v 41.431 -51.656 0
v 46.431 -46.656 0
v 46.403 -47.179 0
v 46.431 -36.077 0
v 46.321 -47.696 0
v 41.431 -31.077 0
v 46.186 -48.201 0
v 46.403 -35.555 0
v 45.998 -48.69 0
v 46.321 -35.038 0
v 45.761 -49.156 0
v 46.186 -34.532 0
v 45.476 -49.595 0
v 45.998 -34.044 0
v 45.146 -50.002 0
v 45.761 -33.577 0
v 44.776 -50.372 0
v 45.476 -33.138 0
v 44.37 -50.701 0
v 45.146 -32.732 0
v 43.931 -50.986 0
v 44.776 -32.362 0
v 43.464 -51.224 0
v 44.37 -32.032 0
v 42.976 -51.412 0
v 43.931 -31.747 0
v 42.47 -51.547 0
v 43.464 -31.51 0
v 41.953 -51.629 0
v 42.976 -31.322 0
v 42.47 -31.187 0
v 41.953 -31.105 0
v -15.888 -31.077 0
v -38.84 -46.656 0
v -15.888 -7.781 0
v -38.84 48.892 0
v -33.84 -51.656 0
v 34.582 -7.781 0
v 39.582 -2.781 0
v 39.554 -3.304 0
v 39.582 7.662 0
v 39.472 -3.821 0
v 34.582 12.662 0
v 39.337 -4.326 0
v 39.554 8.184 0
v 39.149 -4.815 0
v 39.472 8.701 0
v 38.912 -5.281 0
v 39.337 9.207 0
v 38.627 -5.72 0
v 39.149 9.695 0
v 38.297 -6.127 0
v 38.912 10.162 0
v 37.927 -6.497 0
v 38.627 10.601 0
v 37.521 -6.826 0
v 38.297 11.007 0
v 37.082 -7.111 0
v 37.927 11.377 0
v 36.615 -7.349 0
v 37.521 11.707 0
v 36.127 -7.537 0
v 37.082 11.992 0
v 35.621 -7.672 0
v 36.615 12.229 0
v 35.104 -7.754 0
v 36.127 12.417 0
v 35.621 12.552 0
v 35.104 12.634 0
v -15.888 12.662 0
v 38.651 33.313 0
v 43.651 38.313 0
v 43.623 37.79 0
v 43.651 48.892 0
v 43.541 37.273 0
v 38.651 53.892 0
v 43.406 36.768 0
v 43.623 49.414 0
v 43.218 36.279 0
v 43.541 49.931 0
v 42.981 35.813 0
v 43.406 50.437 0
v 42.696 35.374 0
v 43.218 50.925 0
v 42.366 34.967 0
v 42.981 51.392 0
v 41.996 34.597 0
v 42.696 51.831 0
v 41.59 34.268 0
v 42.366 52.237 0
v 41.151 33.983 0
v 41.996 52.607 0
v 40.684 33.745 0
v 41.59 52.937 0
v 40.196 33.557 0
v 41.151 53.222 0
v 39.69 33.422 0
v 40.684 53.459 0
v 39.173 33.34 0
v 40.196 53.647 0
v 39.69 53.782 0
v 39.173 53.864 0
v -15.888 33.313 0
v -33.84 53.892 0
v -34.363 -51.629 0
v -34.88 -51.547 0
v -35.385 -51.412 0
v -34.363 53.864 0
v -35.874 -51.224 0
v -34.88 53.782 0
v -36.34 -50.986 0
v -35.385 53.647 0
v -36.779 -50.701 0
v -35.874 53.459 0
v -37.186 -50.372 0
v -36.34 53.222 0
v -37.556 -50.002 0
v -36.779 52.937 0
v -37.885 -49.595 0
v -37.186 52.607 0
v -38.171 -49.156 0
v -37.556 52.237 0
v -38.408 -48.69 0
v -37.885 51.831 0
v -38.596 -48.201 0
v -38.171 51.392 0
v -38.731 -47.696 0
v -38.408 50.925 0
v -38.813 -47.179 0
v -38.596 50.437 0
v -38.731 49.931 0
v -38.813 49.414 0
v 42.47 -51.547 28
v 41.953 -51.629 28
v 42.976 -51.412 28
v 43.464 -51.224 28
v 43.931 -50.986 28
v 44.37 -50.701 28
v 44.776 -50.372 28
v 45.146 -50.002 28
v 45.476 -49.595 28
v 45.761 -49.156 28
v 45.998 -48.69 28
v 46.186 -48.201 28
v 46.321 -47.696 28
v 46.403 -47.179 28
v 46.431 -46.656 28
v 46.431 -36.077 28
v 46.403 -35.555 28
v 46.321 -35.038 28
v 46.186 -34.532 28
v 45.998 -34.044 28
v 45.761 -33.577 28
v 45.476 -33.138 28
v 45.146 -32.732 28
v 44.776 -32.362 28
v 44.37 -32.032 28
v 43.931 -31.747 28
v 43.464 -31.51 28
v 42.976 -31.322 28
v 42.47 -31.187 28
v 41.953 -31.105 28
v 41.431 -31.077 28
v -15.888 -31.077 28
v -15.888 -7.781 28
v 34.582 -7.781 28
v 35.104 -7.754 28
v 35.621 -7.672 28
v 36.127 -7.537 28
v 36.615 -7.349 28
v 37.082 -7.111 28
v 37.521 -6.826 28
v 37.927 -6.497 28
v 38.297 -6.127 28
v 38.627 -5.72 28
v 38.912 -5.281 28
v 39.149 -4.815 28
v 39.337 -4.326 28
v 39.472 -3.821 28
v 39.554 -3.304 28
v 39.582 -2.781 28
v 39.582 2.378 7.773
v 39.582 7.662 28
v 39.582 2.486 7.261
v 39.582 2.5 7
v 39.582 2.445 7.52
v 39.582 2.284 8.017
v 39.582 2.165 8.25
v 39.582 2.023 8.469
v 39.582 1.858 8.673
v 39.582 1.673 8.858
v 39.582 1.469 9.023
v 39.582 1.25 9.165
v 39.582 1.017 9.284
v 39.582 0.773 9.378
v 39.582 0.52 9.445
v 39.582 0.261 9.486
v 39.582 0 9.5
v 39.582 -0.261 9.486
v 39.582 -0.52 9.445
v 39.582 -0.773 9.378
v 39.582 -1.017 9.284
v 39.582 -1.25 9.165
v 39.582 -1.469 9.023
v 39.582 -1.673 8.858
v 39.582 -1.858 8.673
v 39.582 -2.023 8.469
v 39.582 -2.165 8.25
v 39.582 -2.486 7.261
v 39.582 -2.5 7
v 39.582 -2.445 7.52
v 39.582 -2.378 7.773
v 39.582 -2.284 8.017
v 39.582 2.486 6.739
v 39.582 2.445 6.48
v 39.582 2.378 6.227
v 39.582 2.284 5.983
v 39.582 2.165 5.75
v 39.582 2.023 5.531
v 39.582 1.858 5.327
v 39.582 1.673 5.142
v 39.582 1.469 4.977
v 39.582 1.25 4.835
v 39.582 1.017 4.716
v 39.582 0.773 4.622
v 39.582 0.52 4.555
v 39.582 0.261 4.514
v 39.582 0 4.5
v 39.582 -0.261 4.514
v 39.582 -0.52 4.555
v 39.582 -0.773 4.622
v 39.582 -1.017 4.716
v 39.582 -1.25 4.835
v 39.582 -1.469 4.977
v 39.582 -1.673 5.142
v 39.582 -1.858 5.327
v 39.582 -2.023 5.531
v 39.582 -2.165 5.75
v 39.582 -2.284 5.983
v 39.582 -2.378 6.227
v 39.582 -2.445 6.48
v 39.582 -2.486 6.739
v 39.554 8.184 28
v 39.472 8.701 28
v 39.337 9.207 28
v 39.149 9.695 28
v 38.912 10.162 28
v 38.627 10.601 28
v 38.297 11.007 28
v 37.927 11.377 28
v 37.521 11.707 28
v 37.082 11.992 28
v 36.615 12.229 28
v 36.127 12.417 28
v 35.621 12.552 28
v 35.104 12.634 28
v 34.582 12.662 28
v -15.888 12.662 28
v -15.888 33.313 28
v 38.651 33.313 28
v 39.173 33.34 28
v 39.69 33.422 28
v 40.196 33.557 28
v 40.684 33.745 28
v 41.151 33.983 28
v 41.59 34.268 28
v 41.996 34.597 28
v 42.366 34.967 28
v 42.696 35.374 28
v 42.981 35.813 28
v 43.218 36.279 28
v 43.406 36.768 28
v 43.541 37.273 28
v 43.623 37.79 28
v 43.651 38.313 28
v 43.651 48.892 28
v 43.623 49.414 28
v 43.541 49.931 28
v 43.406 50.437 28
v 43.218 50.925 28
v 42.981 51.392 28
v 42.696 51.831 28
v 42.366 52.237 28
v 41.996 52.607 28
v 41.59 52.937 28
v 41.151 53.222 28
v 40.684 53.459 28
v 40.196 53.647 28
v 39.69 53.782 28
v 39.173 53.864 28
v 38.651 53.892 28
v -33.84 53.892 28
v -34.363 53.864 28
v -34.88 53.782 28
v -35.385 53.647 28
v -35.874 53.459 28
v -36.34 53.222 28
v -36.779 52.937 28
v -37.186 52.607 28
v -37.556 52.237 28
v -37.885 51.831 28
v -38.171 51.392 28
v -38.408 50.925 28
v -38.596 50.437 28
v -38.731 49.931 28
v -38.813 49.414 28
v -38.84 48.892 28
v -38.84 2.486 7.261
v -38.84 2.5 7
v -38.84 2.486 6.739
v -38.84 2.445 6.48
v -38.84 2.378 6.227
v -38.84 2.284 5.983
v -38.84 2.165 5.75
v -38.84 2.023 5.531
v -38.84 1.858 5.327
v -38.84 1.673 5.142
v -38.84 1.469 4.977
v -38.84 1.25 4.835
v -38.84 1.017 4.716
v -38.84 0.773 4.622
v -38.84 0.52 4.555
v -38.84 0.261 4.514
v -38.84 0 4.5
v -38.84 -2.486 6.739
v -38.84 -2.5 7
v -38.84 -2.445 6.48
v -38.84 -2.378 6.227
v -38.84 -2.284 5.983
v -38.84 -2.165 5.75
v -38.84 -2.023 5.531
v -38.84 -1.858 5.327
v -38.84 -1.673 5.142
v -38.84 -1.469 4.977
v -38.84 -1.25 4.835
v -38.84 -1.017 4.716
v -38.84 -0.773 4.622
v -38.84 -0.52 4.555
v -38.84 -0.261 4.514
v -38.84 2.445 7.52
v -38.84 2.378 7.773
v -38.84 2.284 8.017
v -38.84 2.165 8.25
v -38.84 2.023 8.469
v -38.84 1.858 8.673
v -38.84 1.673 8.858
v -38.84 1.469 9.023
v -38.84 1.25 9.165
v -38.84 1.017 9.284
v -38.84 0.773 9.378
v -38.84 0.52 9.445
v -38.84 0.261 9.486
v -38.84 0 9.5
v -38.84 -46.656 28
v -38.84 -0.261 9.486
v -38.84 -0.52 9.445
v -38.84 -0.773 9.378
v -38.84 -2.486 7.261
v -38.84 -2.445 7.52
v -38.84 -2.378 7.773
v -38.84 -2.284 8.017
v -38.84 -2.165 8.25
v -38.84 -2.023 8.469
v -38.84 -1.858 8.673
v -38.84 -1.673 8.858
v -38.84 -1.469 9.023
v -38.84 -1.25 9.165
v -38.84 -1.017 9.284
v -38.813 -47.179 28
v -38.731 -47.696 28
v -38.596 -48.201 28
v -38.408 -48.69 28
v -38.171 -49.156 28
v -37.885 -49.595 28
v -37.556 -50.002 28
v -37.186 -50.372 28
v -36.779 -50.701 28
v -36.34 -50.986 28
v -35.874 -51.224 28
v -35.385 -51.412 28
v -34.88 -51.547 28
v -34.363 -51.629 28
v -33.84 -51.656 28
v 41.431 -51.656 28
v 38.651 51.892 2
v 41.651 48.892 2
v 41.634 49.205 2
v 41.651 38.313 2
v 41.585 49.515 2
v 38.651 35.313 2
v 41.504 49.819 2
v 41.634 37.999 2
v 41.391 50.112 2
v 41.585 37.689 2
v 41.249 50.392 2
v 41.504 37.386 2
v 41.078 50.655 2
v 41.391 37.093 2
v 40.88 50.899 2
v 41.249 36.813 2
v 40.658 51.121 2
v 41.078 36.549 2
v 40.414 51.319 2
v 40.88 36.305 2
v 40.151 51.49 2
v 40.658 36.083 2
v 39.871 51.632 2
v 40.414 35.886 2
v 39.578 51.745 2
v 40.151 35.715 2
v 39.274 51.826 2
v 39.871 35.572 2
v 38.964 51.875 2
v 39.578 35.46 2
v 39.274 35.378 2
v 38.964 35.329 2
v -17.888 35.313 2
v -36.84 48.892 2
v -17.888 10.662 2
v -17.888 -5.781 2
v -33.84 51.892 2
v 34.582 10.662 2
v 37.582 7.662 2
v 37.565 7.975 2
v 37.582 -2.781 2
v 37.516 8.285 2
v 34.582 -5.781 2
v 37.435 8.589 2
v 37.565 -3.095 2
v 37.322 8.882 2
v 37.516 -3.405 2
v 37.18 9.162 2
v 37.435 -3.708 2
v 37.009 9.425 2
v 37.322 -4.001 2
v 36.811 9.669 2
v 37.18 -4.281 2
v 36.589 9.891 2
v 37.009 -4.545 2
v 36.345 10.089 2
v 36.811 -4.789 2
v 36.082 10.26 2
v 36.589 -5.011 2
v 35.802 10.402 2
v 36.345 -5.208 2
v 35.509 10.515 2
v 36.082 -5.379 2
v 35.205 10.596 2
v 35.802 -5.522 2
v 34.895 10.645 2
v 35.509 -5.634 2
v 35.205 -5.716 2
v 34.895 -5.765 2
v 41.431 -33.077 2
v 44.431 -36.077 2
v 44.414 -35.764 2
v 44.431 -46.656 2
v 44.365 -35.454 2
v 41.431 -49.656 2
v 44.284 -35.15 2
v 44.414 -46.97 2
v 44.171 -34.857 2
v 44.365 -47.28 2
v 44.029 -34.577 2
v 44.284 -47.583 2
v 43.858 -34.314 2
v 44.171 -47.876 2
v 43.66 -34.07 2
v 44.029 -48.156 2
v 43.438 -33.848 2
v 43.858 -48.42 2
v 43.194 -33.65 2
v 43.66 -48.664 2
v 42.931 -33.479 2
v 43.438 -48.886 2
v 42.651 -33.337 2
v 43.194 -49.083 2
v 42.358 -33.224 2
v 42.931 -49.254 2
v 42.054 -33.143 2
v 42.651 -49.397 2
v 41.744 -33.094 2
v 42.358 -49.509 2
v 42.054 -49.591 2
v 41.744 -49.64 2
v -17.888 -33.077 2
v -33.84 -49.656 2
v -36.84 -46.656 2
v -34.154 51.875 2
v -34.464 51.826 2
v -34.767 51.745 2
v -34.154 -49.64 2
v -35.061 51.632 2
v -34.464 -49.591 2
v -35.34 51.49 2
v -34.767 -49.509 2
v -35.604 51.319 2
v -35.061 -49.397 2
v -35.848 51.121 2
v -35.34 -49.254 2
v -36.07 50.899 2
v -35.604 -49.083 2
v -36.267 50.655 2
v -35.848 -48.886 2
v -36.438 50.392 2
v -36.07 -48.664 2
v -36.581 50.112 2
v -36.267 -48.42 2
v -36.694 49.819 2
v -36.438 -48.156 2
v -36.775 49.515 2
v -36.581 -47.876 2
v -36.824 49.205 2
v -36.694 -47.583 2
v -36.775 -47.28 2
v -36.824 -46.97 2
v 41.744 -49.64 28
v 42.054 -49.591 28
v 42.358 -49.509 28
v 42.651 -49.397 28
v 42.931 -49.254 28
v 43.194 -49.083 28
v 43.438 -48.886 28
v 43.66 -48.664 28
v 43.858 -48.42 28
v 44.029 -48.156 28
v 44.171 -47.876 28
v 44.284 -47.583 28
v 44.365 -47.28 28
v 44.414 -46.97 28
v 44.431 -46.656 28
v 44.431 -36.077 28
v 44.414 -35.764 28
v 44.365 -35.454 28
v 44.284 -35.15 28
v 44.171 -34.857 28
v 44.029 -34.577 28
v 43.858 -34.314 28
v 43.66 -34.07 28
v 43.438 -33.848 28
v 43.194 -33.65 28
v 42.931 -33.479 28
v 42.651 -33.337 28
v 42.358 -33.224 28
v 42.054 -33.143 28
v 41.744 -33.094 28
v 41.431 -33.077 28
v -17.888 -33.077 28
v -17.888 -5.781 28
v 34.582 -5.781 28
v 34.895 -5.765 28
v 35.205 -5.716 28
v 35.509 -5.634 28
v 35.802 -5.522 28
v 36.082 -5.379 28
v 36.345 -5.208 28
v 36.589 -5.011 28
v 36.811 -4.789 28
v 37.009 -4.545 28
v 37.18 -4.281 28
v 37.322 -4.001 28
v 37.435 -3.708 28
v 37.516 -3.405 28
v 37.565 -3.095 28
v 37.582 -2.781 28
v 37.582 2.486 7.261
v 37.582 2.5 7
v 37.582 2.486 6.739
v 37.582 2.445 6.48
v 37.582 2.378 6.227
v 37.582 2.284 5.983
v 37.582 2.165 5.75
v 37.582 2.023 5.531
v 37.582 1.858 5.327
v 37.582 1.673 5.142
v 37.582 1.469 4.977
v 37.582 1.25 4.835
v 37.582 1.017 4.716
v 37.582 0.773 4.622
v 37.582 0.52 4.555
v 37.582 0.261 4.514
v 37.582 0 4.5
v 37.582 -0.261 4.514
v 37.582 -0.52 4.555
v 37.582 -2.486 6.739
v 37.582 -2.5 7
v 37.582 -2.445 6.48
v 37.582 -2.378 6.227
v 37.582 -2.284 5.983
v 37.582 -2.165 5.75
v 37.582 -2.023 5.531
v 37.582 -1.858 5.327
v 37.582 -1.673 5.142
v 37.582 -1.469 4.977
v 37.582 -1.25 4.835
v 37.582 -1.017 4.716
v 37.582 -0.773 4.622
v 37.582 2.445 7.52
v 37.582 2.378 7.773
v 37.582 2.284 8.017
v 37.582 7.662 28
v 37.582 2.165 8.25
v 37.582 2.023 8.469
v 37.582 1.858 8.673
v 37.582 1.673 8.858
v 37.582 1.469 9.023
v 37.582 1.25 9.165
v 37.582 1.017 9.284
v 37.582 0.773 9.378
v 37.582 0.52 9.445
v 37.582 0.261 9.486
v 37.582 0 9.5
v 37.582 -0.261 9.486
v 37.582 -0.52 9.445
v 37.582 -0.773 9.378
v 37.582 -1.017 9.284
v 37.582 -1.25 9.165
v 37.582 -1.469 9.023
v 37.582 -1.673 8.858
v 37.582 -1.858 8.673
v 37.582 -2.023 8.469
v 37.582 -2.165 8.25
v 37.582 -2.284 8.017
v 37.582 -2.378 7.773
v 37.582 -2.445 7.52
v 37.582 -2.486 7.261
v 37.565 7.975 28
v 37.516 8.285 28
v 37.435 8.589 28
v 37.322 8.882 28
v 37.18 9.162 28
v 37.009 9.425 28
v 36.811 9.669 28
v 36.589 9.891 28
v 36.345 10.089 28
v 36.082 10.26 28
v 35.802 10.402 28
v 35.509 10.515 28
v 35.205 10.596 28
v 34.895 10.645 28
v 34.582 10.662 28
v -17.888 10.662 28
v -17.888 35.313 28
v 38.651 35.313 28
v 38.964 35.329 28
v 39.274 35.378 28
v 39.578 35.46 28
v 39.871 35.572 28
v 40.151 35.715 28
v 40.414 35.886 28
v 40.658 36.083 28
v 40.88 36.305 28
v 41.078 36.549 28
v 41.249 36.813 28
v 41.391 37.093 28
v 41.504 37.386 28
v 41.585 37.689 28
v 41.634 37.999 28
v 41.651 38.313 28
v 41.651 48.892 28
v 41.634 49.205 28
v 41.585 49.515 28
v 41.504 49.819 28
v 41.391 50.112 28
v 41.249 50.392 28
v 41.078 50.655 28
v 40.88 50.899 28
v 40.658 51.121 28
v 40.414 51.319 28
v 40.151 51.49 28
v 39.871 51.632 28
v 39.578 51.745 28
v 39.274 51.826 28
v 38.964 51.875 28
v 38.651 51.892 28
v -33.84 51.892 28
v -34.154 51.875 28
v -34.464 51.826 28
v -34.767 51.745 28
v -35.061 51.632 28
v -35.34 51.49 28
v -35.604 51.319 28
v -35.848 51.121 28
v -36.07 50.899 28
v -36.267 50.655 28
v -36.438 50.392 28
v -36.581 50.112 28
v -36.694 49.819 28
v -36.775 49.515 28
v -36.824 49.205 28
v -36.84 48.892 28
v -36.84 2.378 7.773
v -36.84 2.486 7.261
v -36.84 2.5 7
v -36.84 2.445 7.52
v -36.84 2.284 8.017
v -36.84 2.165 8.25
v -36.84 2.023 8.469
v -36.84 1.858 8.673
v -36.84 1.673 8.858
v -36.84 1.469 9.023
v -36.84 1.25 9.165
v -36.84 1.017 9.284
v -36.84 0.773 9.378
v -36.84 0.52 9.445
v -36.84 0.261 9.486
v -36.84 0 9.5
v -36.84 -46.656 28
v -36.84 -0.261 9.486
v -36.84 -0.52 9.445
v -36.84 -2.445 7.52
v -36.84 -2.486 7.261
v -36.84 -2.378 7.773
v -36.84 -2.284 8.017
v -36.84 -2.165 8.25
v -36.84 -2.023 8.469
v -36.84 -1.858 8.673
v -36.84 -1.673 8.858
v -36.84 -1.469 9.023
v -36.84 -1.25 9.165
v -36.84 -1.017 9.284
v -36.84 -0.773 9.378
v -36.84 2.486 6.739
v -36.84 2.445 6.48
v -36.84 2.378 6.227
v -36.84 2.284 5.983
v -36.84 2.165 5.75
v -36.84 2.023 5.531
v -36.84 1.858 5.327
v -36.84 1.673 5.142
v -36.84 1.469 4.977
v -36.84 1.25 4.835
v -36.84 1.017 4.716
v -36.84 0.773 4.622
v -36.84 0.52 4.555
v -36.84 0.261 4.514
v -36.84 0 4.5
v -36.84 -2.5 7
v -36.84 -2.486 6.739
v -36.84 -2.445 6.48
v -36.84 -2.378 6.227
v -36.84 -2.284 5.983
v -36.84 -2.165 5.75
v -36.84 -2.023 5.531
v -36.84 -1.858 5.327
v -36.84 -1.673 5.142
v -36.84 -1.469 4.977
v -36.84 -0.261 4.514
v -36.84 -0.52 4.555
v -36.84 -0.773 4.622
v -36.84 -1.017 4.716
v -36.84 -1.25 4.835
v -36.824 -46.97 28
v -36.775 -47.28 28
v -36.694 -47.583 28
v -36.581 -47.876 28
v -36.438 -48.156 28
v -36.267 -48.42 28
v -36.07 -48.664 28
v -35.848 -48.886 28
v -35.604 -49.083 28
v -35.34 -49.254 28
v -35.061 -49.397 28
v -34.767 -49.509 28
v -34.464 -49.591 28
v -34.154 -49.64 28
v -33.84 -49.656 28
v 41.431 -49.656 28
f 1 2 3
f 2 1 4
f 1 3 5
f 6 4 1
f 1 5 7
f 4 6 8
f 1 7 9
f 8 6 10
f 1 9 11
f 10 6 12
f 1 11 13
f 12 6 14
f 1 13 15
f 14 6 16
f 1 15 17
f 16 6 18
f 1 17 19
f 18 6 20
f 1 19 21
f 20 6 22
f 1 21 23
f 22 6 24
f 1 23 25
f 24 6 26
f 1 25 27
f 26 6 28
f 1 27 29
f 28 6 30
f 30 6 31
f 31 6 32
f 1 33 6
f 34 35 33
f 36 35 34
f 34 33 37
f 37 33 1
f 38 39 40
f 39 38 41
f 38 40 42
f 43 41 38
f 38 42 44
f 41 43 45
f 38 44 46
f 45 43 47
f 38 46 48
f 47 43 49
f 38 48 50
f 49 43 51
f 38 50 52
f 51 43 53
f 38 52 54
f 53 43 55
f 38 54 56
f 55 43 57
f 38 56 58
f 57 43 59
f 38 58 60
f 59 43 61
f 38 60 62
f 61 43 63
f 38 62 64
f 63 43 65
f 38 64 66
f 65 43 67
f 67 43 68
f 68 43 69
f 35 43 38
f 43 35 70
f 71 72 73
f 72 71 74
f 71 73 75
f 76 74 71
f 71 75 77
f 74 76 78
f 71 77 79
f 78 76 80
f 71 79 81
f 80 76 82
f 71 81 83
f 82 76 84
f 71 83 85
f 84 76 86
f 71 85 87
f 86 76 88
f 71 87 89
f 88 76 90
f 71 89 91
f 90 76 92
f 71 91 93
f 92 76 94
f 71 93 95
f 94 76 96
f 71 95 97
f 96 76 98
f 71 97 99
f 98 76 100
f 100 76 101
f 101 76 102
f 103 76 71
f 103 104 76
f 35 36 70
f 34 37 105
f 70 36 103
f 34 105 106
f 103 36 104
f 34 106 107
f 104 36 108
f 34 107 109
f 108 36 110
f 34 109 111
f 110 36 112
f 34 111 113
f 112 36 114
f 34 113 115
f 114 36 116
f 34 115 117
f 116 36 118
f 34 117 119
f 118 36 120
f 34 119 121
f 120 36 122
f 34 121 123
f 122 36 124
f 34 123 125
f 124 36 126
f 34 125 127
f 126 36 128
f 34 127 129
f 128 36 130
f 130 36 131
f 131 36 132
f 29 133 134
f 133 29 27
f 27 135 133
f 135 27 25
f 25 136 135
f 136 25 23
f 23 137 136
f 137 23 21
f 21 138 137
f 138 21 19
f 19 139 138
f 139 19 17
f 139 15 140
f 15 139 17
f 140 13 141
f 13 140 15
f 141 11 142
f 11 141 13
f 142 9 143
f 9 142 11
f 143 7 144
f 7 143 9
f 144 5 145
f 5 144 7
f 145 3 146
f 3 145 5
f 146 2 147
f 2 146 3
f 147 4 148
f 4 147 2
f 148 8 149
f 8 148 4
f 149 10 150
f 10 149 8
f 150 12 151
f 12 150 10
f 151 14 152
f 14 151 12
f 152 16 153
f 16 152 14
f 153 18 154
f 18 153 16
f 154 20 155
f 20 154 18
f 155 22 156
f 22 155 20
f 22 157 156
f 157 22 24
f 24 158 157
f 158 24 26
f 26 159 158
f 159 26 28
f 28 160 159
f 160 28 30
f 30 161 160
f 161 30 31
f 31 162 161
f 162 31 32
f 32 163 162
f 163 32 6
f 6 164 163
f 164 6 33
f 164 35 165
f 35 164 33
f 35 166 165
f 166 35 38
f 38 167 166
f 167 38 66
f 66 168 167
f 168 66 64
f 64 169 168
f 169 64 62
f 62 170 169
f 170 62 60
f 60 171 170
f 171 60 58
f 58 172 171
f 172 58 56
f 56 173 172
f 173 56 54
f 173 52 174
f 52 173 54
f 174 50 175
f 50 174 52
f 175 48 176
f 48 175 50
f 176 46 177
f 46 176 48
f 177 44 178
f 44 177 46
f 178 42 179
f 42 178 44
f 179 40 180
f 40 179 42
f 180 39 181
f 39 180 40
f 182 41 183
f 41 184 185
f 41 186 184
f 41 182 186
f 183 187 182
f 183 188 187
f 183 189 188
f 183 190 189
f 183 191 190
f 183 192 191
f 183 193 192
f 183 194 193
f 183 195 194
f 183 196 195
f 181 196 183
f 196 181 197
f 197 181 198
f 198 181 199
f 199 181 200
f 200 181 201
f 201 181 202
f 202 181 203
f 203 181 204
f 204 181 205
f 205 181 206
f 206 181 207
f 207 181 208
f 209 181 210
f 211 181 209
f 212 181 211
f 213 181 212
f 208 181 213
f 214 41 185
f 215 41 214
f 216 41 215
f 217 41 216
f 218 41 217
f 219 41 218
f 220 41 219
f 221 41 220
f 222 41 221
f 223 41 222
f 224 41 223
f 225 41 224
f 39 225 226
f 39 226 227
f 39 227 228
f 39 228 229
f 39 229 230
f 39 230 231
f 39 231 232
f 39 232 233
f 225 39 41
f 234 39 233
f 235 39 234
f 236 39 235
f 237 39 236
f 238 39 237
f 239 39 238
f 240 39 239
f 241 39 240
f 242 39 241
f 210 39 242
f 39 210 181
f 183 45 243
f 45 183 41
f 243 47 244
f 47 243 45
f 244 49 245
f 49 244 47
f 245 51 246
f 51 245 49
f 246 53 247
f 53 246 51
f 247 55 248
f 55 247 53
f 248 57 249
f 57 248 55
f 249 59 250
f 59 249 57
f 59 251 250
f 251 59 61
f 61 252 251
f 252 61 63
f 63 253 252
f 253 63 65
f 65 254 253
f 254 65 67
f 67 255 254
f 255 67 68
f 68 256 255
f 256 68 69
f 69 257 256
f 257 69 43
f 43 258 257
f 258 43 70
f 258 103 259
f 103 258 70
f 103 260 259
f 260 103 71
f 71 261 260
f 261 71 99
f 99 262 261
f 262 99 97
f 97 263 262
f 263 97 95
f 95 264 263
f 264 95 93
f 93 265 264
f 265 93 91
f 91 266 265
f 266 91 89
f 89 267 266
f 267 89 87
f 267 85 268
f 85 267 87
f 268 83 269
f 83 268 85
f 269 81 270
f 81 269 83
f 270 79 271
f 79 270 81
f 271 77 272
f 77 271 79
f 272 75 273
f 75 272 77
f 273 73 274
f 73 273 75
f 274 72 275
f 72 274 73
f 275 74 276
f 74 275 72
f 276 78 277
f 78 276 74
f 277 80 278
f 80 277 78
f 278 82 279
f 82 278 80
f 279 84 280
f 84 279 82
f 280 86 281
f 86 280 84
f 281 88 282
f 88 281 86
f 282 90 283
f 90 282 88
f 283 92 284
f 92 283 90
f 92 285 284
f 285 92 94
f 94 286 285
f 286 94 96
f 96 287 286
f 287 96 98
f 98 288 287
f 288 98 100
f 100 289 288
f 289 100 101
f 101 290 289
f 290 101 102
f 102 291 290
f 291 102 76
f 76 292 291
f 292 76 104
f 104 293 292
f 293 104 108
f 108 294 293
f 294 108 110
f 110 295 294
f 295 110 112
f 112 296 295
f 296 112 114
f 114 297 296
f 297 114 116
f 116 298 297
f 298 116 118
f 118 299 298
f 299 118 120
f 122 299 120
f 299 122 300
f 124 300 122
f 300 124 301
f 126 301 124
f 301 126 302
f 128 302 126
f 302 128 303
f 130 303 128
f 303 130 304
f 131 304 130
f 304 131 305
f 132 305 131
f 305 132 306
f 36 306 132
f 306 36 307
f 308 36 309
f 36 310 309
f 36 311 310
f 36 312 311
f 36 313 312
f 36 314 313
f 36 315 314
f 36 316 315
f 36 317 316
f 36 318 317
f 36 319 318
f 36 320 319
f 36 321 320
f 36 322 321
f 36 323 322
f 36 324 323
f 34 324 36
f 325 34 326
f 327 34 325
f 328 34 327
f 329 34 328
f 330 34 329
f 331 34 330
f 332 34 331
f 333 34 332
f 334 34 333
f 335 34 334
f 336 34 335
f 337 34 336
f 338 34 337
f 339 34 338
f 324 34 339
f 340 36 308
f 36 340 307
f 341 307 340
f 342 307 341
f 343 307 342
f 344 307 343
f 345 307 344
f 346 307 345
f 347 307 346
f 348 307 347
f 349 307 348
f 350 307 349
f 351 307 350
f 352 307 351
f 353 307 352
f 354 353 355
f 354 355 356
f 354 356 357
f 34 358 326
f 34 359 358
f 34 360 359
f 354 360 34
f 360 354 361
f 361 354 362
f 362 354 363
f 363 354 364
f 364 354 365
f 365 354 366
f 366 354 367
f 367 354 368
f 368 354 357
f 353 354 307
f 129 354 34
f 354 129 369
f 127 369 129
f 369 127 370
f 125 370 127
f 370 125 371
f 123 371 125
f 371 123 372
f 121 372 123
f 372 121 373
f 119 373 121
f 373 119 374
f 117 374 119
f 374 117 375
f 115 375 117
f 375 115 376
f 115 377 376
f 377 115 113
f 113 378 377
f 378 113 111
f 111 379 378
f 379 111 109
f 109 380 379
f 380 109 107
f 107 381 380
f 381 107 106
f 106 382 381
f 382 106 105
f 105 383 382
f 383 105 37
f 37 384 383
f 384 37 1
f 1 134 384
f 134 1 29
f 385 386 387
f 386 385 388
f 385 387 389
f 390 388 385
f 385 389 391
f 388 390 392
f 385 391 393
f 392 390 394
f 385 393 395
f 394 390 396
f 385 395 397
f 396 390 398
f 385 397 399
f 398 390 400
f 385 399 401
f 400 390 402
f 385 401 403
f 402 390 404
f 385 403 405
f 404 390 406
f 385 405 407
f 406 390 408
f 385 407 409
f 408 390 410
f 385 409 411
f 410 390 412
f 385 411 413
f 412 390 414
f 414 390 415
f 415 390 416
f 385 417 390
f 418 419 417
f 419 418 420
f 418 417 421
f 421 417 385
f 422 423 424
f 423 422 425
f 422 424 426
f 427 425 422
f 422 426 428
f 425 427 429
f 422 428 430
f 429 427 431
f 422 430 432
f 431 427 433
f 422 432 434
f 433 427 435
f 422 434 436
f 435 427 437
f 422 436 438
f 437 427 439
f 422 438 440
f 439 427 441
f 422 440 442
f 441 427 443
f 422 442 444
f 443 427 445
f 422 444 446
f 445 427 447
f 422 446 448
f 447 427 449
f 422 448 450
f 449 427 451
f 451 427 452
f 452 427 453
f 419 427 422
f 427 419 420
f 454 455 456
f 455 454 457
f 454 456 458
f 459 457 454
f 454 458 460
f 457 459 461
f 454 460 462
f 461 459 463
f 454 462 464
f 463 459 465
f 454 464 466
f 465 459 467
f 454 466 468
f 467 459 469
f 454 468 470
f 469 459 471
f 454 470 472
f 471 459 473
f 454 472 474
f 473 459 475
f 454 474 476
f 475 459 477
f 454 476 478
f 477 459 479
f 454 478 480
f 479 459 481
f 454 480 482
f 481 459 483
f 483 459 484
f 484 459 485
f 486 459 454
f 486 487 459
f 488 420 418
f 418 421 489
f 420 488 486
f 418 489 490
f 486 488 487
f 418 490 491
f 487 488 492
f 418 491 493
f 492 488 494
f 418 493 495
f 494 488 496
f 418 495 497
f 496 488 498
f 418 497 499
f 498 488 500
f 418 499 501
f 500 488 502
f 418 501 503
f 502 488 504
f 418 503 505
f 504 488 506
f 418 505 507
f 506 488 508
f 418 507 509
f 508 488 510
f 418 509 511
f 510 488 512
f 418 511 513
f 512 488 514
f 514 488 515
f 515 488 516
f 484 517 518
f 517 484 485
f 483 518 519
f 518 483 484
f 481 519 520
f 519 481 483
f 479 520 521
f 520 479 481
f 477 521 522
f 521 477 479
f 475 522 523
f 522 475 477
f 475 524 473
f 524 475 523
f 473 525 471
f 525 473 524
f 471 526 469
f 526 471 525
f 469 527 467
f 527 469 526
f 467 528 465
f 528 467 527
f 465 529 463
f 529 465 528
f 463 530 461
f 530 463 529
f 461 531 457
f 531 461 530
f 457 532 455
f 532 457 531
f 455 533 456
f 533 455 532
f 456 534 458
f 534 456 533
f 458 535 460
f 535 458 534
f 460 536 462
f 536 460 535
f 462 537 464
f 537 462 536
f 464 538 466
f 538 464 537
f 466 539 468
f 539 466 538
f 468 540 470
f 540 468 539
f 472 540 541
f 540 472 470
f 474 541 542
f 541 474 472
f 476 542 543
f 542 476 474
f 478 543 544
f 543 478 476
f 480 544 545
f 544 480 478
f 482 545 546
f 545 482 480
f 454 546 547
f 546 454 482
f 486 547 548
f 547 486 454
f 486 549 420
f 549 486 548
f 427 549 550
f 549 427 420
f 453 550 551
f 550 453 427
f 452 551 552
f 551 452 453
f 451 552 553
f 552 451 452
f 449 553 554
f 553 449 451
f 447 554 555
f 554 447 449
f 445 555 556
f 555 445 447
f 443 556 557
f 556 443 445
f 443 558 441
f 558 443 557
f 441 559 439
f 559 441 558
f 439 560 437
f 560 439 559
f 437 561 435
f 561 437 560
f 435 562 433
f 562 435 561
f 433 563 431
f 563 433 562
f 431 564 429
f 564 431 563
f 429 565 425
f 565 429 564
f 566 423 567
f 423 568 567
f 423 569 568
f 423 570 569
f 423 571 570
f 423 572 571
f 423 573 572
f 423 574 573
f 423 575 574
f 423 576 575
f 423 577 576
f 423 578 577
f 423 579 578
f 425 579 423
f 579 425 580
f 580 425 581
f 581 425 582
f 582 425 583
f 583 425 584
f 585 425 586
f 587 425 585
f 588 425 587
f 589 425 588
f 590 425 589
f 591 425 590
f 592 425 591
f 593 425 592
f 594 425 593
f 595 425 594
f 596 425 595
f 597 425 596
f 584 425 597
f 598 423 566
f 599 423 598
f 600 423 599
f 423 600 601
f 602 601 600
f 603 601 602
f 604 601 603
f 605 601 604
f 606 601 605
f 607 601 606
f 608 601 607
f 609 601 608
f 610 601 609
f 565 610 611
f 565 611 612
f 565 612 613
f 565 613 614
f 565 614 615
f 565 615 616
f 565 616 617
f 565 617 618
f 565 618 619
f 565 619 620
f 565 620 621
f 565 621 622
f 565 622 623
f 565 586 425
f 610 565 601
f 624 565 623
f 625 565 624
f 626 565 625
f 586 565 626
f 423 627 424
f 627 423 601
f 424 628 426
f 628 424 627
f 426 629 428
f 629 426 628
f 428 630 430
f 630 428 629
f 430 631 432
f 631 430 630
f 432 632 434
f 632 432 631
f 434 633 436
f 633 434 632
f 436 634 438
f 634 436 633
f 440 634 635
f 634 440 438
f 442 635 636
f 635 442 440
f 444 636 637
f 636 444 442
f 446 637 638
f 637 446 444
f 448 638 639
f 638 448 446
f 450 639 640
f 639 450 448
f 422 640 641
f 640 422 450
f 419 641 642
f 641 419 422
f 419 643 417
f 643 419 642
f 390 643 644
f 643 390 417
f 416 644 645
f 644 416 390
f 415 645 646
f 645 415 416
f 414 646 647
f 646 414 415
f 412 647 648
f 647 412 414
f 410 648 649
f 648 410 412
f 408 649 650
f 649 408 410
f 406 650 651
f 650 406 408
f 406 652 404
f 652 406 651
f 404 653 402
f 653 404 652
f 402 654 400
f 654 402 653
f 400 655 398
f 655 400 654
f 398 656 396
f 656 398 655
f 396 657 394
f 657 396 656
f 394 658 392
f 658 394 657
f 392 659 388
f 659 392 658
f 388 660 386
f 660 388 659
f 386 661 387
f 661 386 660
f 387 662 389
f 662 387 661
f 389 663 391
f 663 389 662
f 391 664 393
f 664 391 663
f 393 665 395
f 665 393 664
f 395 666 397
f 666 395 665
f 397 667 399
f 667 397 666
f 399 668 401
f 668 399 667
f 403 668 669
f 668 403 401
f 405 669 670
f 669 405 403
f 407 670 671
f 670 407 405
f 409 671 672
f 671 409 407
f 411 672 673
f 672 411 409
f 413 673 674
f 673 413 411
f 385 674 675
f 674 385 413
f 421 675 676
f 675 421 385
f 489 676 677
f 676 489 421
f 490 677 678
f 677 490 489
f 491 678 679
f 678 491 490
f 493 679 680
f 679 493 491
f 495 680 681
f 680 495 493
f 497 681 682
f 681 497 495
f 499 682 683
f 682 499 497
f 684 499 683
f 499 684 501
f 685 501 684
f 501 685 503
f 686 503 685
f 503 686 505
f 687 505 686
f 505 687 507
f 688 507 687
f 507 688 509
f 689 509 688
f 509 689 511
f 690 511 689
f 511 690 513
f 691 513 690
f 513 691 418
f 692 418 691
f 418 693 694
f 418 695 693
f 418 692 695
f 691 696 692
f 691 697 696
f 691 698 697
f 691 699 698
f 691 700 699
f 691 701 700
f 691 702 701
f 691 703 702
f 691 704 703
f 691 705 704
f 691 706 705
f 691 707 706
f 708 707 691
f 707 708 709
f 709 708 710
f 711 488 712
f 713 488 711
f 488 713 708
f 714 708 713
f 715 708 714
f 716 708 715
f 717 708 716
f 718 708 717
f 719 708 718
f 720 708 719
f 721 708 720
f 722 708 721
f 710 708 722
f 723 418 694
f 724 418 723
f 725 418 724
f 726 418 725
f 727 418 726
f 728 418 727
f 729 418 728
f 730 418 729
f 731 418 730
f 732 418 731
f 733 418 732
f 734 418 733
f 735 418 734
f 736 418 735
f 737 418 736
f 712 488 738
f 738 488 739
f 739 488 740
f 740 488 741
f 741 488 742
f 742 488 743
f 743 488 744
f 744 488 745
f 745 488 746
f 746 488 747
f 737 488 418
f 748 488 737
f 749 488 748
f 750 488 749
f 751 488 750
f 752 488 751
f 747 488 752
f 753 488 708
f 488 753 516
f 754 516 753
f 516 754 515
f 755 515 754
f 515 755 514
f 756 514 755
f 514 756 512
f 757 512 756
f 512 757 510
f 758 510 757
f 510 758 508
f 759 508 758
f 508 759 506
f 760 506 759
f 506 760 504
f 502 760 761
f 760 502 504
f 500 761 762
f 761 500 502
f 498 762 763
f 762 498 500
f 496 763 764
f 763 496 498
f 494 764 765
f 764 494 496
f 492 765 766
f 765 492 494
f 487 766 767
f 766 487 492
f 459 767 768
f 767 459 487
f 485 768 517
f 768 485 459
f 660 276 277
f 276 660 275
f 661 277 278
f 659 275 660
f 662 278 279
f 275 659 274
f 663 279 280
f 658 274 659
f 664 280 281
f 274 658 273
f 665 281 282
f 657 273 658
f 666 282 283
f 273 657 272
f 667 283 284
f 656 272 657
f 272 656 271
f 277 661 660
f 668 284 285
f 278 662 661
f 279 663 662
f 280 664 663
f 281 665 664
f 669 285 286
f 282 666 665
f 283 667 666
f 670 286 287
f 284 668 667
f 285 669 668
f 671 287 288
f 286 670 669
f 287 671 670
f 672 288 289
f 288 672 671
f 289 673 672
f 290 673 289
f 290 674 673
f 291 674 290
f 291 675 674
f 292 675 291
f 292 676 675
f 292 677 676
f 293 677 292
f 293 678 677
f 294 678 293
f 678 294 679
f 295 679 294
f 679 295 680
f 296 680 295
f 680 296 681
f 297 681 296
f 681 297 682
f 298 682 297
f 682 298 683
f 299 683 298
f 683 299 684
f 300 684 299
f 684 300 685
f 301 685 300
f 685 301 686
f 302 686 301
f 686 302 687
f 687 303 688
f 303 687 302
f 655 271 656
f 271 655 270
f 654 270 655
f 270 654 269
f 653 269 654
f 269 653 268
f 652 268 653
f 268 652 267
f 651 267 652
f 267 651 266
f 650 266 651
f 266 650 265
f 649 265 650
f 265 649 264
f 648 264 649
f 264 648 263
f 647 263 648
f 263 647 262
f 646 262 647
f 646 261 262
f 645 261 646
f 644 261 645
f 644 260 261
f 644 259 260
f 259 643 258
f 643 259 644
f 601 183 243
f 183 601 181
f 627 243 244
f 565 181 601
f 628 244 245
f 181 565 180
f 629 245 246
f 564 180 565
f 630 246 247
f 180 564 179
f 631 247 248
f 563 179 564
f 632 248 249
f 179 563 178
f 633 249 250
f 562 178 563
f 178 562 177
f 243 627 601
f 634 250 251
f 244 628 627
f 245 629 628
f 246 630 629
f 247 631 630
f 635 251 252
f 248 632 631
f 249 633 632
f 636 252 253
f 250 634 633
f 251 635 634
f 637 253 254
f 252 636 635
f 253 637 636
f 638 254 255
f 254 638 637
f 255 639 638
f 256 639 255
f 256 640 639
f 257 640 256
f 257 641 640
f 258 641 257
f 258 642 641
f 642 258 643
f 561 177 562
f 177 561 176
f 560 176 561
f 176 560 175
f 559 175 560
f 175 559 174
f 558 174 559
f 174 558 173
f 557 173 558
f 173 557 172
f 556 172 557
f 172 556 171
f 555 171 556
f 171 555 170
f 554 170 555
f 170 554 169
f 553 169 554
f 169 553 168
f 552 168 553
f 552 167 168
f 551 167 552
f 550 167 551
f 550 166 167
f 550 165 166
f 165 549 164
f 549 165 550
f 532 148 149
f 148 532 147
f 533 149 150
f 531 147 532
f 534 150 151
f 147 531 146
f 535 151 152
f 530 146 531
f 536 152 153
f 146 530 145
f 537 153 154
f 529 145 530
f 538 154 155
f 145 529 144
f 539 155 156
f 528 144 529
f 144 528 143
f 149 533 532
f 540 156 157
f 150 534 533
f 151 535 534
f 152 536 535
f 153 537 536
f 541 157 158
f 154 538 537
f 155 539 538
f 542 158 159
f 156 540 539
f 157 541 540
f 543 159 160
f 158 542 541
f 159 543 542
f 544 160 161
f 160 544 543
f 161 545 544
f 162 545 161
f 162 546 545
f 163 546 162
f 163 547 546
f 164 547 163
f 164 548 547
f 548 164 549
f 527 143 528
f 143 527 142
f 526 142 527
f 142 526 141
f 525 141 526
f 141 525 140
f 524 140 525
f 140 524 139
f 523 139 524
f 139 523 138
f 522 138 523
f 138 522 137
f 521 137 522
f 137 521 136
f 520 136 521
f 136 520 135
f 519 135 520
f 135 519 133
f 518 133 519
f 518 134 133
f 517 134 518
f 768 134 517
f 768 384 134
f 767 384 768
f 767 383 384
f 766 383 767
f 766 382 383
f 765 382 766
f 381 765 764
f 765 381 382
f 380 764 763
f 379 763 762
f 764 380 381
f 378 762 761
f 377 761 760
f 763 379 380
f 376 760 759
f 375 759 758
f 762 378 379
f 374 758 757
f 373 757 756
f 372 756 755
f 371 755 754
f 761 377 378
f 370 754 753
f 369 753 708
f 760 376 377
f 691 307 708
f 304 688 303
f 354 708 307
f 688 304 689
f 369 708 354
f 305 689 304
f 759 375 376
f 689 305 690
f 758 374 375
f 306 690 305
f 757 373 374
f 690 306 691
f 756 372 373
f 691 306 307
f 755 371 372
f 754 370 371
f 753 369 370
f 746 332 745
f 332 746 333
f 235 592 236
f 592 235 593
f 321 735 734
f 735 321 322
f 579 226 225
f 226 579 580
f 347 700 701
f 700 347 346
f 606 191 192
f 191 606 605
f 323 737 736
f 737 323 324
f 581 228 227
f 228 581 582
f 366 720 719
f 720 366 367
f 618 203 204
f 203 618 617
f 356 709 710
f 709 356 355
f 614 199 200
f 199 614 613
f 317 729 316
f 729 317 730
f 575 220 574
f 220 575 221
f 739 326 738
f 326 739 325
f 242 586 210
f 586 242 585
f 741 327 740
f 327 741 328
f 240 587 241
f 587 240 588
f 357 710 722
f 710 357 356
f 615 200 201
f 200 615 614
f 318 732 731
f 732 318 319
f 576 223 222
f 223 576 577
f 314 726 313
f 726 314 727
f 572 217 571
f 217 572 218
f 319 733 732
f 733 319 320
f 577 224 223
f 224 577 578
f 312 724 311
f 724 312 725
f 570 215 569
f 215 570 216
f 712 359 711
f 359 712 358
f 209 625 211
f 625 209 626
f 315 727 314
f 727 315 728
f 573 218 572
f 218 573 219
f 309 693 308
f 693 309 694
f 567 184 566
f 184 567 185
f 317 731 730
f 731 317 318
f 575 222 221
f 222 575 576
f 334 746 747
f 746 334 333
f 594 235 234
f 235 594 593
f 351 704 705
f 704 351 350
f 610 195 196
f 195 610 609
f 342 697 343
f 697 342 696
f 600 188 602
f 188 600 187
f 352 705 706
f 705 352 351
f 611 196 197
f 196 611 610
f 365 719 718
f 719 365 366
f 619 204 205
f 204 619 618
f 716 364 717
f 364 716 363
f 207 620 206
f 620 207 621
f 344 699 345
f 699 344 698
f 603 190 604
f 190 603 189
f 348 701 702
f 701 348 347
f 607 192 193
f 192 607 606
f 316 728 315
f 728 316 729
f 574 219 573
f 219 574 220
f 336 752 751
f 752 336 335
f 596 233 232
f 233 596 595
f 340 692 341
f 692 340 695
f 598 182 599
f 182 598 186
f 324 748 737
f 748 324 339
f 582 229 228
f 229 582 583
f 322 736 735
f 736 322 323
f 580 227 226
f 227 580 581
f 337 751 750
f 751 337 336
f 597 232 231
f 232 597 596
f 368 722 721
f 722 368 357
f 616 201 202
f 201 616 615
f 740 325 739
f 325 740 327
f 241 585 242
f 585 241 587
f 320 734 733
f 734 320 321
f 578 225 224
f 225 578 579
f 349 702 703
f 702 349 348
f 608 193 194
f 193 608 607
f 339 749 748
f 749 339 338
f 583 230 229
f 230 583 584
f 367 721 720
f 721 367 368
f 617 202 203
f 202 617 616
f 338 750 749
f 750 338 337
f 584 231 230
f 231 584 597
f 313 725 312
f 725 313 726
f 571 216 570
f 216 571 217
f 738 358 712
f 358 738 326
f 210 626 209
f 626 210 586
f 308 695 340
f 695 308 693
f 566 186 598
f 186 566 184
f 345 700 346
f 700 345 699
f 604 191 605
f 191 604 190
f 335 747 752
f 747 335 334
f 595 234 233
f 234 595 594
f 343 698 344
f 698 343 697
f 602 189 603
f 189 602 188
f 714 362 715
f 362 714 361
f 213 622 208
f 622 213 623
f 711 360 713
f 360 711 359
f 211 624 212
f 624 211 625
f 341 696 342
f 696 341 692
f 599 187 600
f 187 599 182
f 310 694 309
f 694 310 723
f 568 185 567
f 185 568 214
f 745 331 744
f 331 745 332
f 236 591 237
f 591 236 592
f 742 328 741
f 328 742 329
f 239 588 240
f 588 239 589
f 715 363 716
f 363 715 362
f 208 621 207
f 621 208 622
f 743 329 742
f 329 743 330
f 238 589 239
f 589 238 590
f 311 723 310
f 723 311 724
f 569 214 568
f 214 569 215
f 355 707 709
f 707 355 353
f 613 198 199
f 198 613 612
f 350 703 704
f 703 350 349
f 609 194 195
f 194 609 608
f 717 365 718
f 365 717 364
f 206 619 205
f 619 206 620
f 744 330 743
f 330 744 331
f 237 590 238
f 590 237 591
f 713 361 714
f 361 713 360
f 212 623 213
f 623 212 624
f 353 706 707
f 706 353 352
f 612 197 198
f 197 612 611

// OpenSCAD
// AUTOMATICALLY GENERATED FILE: Letter_E
// SIGN SCULPTOR ENGINE V2

Render_Mode = "Body"; // Set to "Lid" to export the cover
Letter = "E";
Font_Size = 100;
Font_Name = "Arial:style=Black";
Light_Type = "Silicone_Neon_6mm";

// -- Engineering Constants --
Sign_Height = 30.0;
Wall_Thickness = 2.0;
Base_Thickness = 2.0;
Lid_Tolerance = 0.15;
Hole_Height = 5.0;
Hole_Size = 5.0;

// -- Logic Engine --
CW = (Light_Type == "Silicone_Neon_6mm") ? 6.0 :
     (Light_Type == "Silicone_Neon_8mm") ? 8.0 :
     (Light_Type == "LED_Strip_10mm")    ? 10.5 :
     (Light_Type == "Individual_Pixels")  ? 14.0 : 6.0;

Lip_Overhang = (Light_Type == "Silicone_Neon_6mm" || Light_Type == "Silicone_Neon_8mm") ? 0.4 : 0.0;

$fn = 60;

module letter_shape() {
    text(text=Letter, size=Font_Size, font=Font_Name, halign="center", valign="center");
}

module body_geometry() {
    difference() {
        // 1. Positive Block
        linear_extrude(Sign_Height)
            offset(r = CW/2 + Wall_Thickness)
            letter_shape();

        // 2. Light Channel
        translate([0,0, Base_Thickness])
            linear_extrude(Sign_Height + 1)
            offset(r = CW/2)
            letter_shape();

        // 3. Friction Lip
        if (Lip_Overhang > 0) {
            translate([0,0, Sign_Height - 2.0])
                linear_extrude(3.0)
                difference() {
                    offset(r = CW/2 + 5) letter_shape();
                    offset(r = CW/2 - Lip_Overhang) letter_shape();
                }
        }
        
        // 4. Lid Shelf
        translate([0,0, Sign_Height - 2.0])
            linear_extrude(3.0)
            offset(r = CW/2 + 1.5)
            letter_shape();

        // 5. WIRE CHANNELS (Dynamic Side Holes)
        // Left Hole
        translate([-Font_Size/1.8, 0, Hole_Height + Base_Thickness])
            rotate([0, 90, 0])
            cylinder(h = Font_Size, r = Hole_Size/2);
            
        // Right Hole
        translate([Font_Size/1.8, 0, Hole_Height + Base_Thickness])
            rotate([0, -90, 0])
            cylinder(h = Font_Size, r = Hole_Size/2);
    }
}

module lid_geometry() {
    color("White")
        linear_extrude(2.0)
        offset(r = (CW/2 + 1.5) - Lid_Tolerance)
        letter_shape();
}

// Render Controller
if (Render_Mode == "Body") {
    body_geometry();
} else if (Render_Mode == "Lid") {
    lid_geometry();
}
